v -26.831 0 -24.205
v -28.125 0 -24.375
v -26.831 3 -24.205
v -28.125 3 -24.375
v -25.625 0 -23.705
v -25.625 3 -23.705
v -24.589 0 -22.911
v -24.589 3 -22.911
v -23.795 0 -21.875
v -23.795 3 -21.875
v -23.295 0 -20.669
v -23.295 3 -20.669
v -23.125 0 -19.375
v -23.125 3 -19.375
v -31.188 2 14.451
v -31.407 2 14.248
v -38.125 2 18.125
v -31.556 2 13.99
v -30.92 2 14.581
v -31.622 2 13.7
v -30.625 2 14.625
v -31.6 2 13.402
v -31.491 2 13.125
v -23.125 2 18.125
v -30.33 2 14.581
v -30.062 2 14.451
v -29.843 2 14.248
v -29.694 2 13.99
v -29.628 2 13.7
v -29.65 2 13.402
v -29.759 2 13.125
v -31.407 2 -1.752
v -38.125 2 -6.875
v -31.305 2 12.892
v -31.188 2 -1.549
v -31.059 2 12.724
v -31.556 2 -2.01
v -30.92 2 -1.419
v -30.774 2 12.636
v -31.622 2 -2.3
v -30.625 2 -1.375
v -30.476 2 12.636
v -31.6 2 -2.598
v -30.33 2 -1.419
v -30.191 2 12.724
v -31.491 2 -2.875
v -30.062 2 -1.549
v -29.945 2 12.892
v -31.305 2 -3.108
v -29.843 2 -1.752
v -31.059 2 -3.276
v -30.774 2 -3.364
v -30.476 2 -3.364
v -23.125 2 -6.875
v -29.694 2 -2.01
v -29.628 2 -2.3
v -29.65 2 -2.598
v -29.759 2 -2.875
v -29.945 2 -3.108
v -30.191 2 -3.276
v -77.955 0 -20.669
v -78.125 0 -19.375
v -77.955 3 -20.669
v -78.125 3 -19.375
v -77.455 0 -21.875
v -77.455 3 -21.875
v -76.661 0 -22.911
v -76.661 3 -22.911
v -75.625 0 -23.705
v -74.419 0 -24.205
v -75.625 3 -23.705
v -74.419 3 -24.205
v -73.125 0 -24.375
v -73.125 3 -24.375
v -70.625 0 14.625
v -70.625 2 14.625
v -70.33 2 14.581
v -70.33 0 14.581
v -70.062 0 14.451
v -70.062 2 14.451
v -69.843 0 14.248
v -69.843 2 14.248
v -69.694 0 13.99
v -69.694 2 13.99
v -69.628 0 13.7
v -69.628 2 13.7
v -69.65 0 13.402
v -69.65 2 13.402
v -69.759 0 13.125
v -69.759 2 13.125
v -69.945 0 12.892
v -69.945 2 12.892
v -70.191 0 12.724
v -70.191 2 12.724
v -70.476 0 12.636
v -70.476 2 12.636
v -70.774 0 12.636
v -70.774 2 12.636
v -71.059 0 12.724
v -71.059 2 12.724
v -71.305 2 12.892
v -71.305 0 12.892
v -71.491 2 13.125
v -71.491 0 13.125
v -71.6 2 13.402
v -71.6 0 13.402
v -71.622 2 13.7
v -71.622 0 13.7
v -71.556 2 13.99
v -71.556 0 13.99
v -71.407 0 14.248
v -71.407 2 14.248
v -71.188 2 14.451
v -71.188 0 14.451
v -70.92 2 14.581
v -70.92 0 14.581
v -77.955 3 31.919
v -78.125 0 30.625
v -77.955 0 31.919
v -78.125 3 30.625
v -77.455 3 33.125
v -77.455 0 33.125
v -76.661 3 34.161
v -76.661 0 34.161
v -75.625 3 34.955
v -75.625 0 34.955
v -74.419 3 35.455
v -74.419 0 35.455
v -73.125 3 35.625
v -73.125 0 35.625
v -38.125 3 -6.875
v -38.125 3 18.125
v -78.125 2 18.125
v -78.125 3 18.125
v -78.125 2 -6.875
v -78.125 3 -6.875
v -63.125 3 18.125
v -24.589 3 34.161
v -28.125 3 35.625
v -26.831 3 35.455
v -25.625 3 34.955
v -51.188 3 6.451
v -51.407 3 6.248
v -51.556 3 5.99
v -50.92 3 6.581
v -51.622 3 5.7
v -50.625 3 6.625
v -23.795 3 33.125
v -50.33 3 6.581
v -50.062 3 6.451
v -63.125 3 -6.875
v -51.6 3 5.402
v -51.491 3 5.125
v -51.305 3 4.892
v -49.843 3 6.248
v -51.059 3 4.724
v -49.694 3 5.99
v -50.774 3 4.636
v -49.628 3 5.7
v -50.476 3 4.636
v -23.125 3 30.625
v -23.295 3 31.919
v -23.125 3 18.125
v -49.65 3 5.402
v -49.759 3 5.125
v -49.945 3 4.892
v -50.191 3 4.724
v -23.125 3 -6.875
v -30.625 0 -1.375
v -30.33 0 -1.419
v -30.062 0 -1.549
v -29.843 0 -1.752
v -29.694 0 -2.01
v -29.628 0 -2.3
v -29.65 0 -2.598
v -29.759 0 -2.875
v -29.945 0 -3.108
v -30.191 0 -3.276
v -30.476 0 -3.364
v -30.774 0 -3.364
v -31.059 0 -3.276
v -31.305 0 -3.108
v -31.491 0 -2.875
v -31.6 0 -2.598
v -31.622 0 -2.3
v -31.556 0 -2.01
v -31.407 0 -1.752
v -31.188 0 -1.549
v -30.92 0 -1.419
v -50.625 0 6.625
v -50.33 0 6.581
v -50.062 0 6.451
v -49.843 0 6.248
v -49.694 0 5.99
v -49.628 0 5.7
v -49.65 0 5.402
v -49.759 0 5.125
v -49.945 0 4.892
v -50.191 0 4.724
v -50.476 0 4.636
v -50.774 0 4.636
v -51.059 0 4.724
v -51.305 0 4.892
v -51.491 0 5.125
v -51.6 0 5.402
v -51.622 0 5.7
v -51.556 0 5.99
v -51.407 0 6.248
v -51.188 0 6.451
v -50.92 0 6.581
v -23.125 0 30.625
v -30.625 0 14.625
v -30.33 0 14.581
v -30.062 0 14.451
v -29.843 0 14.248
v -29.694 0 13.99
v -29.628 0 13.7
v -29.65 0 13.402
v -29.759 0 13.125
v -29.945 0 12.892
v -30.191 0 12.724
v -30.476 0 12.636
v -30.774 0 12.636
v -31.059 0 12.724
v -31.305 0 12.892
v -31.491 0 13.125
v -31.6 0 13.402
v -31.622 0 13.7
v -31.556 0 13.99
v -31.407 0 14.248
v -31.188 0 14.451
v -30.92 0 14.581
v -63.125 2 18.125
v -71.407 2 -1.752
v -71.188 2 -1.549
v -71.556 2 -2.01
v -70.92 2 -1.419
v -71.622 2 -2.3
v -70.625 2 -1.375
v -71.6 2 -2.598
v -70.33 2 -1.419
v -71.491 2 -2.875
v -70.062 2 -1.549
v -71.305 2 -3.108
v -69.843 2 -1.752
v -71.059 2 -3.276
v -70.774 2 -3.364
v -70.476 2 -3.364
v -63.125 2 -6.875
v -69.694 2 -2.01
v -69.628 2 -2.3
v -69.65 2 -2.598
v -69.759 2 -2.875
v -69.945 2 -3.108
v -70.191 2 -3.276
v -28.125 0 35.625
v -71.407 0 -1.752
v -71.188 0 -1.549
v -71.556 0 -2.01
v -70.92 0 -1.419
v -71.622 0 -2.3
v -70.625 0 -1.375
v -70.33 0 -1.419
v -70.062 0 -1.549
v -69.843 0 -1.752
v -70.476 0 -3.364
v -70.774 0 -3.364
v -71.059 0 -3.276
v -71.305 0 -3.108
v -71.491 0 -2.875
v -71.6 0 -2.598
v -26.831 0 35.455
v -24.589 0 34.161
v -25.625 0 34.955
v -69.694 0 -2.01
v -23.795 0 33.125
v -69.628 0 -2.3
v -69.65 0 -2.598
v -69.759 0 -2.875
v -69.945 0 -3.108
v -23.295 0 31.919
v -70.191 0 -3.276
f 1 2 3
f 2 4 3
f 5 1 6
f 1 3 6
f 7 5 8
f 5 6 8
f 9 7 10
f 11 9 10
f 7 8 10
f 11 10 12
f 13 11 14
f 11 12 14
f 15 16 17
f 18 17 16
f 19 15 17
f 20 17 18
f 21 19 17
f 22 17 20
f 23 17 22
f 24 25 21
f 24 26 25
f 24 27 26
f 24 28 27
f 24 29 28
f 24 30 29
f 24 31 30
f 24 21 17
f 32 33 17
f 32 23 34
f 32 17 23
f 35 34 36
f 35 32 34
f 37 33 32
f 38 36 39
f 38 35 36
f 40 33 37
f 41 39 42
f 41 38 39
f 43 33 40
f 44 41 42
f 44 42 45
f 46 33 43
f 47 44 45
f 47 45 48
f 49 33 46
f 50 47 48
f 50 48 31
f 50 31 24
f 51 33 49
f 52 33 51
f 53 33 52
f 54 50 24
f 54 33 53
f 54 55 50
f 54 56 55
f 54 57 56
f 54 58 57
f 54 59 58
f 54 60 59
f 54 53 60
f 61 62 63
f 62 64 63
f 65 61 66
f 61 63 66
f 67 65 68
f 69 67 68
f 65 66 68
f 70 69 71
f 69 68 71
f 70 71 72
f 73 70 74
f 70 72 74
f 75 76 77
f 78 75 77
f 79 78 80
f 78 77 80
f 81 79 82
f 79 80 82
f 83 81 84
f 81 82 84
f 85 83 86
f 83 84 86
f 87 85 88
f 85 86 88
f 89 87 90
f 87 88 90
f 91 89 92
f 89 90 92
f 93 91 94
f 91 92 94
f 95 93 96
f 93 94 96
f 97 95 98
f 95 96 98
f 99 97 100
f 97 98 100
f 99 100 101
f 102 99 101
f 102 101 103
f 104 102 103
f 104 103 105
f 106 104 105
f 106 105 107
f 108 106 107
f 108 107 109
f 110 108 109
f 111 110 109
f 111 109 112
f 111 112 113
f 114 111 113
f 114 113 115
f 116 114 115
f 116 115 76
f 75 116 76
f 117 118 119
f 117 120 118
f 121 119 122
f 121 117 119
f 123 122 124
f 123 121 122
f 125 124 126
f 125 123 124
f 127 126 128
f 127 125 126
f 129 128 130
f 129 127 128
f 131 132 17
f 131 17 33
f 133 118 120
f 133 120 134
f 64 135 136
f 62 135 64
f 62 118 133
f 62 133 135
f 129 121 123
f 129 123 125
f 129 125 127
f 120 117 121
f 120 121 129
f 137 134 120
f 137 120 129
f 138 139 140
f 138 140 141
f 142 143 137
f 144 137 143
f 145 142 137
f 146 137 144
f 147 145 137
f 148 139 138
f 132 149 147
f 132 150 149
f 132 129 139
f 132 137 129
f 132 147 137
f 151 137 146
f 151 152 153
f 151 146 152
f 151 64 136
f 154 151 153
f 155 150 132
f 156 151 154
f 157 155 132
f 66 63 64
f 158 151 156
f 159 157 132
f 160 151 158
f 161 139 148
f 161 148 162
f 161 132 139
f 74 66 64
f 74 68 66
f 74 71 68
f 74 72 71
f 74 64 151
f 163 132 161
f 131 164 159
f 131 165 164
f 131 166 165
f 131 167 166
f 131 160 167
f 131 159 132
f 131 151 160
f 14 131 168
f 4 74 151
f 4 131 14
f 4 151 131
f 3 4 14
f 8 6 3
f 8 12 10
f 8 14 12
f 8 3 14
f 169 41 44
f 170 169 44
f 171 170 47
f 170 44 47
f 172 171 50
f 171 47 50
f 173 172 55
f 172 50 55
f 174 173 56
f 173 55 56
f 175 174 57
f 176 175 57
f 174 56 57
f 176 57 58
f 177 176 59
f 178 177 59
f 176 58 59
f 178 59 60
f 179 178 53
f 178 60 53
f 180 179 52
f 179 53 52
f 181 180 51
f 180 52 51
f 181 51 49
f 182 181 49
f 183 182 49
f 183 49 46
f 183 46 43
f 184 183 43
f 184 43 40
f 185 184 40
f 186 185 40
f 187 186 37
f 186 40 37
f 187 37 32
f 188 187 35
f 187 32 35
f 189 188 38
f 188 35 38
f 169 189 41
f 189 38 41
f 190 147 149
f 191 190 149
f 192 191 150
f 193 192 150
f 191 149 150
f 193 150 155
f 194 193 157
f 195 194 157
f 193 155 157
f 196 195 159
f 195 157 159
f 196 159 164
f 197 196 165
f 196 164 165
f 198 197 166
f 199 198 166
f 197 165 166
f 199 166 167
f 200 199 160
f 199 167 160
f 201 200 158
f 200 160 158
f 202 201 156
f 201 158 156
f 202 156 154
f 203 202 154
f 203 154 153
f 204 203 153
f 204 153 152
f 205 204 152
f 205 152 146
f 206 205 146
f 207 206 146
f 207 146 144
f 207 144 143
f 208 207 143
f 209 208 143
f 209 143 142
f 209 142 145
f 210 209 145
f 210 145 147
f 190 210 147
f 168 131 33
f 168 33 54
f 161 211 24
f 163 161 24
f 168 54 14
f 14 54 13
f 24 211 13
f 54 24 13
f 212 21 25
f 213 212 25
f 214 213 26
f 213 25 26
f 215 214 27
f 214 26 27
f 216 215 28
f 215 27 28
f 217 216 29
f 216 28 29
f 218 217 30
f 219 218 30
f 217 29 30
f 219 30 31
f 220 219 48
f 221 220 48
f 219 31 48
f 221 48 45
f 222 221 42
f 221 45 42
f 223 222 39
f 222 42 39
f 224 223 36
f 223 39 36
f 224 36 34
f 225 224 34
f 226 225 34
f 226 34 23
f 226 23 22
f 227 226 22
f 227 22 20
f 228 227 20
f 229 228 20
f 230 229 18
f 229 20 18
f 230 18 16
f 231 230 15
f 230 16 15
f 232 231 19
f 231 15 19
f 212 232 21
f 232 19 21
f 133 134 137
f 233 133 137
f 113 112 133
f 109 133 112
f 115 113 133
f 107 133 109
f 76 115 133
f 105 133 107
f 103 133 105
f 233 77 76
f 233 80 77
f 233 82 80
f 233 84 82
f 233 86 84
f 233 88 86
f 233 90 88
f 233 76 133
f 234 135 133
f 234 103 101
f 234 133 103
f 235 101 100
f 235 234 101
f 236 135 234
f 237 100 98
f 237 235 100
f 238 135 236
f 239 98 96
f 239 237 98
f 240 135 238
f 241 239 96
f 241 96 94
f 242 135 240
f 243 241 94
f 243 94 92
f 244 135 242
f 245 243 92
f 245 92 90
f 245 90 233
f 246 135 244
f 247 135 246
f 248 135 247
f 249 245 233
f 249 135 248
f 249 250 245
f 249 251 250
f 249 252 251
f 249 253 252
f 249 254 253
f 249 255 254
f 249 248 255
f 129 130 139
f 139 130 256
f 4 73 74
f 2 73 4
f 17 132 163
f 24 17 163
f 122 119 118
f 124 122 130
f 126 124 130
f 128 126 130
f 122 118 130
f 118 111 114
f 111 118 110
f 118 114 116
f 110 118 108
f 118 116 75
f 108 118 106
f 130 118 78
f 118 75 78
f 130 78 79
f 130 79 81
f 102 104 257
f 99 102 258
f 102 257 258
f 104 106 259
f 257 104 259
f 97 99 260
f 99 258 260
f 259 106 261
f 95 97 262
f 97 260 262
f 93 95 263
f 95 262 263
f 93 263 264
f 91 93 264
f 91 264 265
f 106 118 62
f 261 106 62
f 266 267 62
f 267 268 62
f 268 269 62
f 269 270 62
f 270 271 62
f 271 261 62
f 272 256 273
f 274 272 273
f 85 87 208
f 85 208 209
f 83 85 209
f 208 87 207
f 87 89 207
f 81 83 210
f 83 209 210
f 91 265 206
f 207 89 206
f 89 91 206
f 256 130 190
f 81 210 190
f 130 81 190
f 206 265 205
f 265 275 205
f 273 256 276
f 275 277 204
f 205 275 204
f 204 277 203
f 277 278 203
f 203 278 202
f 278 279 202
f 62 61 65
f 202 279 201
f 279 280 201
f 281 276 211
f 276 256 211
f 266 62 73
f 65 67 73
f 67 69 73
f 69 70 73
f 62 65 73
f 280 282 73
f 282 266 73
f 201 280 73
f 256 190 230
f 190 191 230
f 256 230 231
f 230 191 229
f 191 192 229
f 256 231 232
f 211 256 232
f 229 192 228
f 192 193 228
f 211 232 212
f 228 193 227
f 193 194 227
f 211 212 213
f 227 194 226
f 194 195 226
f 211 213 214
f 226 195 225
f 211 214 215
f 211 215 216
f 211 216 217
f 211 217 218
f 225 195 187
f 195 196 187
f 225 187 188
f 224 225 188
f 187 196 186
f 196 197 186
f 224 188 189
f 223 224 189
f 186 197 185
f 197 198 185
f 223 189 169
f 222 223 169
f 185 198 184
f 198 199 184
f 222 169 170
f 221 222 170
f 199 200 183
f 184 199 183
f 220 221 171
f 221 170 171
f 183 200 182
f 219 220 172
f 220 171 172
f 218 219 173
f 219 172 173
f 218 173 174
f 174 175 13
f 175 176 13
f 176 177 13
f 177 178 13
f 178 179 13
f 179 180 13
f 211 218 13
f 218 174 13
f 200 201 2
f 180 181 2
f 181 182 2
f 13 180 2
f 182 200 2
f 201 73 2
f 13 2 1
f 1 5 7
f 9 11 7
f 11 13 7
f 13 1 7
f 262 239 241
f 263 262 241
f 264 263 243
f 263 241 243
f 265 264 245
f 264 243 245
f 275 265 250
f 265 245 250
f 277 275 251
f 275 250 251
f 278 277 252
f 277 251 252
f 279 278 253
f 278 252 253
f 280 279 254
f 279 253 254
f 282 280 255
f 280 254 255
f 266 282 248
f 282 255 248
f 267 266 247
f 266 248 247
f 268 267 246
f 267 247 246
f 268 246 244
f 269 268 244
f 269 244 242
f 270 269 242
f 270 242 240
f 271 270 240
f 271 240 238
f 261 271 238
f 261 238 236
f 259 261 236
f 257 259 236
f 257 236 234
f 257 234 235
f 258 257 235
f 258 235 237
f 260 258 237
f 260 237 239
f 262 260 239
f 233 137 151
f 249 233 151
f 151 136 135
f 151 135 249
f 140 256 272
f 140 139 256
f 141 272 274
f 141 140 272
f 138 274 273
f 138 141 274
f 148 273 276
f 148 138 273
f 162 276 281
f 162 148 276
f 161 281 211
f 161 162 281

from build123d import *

# Parameters (mm, degrees)
SKETCH2_W           = 55
SKETCH2_H           = 60
BOSS_EXTRUDE1_DEPTH = 3
SKETCH3_W           = 15
SKETCH3_H           = 25
CUT_EXTRUDE1_DEPTH  = 1
SKETCH4_R           = 1
CUT_EXTRUDE3_DEPTH  = 5
FILLET1_R           = 5
SKETCH5_R           = 1
CUT_EXTRUDE4_DEPTH  = 5
SKETCH6_W           = 15
SKETCH6_H           = 25
CUT_EXTRUDE5_DEPTH  = 1
SKETCH7_R           = 1
CUT_EXTRUDE6_DEPTH  = 2


with BuildPart() as part:
    # Sketch2 → Boss-Extrude1 (new body)
    with BuildSketch(Plane(origin=(0, 0, 0), x_dir=(1, 0, 0), z_dir=(0, 1, 0))):
        with Locations((-50.625, -5.625)):
            Rectangle(SKETCH2_W, SKETCH2_H)
    extrude(amount=BOSS_EXTRUDE1_DEPTH)

    # Sketch3 → Cut-Extrude1 (cut)
    with BuildSketch(Plane(origin=(0, 3, 0), x_dir=(1, 0, 0), z_dir=(0, 1, 0))):
        with Locations((-70.625, -5.625)):
            Rectangle(SKETCH3_W, SKETCH3_H)
    extrude(amount=-CUT_EXTRUDE1_DEPTH, mode=Mode.SUBTRACT)

    # Sketch4 → Cut-Extrude3 (cut)
    with BuildSketch(Plane(origin=(0, 3, 0), x_dir=(1, 0, 0), z_dir=(0, 1, 0))):
        with Locations(Location((-70.625, 2.375, 0), (0, 0, 270))):
            Circle(SKETCH4_R)
        with Locations(Location((-70.625, -13.625, 0), (0, 0, 270))):
            Circle(SKETCH4_R)
    extrude(amount=-CUT_EXTRUDE3_DEPTH, mode=Mode.SUBTRACT)

    # Fillet1
    fillet1_edges = [part.edges().sort_by_distance(p)[0] for p in [
        (-78.125, 1.5, -24.375),
        (-23.125, 1.5, -24.375),
        (-23.125, 1.5, 35.625),
        (-78.125, 1.5, 35.625),
    ]]
    fillet(fillet1_edges, radius=FILLET1_R)

    # Sketch5 → Cut-Extrude4 (cut)
    with BuildSketch(Plane(origin=(0, 3, 0), x_dir=(1, 0, 0), z_dir=(0, 1, 0))):
        with Locations(Location((-50.625, -5.625, 0), (0, 0, 270))):
            Circle(SKETCH5_R)
    extrude(amount=-CUT_EXTRUDE4_DEPTH, mode=Mode.SUBTRACT)

    # Sketch6 → Cut-Extrude5 (cut)
    with BuildSketch(Plane(origin=(0, 3, 0), x_dir=(1, 0, 0), z_dir=(0, 1, 0))):
        with Locations((-30.625, -5.625)):
            Rectangle(SKETCH6_W, SKETCH6_H)
    extrude(amount=-CUT_EXTRUDE5_DEPTH, mode=Mode.SUBTRACT)

    # Sketch7 → Cut-Extrude6 (cut)
    with BuildSketch(Plane(origin=(0, 2, 0), x_dir=(1, 0, 0), z_dir=(0, 1, 0))):
        with Locations(Location((-30.625, 2.375, 0), (0, 0, 270))):
            Circle(SKETCH7_R)
        with Locations(Location((-30.625, -13.625, 0), (0, 0, 270))):
            Circle(SKETCH7_R)
    extrude(amount=-CUT_EXTRUDE6_DEPTH, mode=Mode.SUBTRACT)


solid = part.part
